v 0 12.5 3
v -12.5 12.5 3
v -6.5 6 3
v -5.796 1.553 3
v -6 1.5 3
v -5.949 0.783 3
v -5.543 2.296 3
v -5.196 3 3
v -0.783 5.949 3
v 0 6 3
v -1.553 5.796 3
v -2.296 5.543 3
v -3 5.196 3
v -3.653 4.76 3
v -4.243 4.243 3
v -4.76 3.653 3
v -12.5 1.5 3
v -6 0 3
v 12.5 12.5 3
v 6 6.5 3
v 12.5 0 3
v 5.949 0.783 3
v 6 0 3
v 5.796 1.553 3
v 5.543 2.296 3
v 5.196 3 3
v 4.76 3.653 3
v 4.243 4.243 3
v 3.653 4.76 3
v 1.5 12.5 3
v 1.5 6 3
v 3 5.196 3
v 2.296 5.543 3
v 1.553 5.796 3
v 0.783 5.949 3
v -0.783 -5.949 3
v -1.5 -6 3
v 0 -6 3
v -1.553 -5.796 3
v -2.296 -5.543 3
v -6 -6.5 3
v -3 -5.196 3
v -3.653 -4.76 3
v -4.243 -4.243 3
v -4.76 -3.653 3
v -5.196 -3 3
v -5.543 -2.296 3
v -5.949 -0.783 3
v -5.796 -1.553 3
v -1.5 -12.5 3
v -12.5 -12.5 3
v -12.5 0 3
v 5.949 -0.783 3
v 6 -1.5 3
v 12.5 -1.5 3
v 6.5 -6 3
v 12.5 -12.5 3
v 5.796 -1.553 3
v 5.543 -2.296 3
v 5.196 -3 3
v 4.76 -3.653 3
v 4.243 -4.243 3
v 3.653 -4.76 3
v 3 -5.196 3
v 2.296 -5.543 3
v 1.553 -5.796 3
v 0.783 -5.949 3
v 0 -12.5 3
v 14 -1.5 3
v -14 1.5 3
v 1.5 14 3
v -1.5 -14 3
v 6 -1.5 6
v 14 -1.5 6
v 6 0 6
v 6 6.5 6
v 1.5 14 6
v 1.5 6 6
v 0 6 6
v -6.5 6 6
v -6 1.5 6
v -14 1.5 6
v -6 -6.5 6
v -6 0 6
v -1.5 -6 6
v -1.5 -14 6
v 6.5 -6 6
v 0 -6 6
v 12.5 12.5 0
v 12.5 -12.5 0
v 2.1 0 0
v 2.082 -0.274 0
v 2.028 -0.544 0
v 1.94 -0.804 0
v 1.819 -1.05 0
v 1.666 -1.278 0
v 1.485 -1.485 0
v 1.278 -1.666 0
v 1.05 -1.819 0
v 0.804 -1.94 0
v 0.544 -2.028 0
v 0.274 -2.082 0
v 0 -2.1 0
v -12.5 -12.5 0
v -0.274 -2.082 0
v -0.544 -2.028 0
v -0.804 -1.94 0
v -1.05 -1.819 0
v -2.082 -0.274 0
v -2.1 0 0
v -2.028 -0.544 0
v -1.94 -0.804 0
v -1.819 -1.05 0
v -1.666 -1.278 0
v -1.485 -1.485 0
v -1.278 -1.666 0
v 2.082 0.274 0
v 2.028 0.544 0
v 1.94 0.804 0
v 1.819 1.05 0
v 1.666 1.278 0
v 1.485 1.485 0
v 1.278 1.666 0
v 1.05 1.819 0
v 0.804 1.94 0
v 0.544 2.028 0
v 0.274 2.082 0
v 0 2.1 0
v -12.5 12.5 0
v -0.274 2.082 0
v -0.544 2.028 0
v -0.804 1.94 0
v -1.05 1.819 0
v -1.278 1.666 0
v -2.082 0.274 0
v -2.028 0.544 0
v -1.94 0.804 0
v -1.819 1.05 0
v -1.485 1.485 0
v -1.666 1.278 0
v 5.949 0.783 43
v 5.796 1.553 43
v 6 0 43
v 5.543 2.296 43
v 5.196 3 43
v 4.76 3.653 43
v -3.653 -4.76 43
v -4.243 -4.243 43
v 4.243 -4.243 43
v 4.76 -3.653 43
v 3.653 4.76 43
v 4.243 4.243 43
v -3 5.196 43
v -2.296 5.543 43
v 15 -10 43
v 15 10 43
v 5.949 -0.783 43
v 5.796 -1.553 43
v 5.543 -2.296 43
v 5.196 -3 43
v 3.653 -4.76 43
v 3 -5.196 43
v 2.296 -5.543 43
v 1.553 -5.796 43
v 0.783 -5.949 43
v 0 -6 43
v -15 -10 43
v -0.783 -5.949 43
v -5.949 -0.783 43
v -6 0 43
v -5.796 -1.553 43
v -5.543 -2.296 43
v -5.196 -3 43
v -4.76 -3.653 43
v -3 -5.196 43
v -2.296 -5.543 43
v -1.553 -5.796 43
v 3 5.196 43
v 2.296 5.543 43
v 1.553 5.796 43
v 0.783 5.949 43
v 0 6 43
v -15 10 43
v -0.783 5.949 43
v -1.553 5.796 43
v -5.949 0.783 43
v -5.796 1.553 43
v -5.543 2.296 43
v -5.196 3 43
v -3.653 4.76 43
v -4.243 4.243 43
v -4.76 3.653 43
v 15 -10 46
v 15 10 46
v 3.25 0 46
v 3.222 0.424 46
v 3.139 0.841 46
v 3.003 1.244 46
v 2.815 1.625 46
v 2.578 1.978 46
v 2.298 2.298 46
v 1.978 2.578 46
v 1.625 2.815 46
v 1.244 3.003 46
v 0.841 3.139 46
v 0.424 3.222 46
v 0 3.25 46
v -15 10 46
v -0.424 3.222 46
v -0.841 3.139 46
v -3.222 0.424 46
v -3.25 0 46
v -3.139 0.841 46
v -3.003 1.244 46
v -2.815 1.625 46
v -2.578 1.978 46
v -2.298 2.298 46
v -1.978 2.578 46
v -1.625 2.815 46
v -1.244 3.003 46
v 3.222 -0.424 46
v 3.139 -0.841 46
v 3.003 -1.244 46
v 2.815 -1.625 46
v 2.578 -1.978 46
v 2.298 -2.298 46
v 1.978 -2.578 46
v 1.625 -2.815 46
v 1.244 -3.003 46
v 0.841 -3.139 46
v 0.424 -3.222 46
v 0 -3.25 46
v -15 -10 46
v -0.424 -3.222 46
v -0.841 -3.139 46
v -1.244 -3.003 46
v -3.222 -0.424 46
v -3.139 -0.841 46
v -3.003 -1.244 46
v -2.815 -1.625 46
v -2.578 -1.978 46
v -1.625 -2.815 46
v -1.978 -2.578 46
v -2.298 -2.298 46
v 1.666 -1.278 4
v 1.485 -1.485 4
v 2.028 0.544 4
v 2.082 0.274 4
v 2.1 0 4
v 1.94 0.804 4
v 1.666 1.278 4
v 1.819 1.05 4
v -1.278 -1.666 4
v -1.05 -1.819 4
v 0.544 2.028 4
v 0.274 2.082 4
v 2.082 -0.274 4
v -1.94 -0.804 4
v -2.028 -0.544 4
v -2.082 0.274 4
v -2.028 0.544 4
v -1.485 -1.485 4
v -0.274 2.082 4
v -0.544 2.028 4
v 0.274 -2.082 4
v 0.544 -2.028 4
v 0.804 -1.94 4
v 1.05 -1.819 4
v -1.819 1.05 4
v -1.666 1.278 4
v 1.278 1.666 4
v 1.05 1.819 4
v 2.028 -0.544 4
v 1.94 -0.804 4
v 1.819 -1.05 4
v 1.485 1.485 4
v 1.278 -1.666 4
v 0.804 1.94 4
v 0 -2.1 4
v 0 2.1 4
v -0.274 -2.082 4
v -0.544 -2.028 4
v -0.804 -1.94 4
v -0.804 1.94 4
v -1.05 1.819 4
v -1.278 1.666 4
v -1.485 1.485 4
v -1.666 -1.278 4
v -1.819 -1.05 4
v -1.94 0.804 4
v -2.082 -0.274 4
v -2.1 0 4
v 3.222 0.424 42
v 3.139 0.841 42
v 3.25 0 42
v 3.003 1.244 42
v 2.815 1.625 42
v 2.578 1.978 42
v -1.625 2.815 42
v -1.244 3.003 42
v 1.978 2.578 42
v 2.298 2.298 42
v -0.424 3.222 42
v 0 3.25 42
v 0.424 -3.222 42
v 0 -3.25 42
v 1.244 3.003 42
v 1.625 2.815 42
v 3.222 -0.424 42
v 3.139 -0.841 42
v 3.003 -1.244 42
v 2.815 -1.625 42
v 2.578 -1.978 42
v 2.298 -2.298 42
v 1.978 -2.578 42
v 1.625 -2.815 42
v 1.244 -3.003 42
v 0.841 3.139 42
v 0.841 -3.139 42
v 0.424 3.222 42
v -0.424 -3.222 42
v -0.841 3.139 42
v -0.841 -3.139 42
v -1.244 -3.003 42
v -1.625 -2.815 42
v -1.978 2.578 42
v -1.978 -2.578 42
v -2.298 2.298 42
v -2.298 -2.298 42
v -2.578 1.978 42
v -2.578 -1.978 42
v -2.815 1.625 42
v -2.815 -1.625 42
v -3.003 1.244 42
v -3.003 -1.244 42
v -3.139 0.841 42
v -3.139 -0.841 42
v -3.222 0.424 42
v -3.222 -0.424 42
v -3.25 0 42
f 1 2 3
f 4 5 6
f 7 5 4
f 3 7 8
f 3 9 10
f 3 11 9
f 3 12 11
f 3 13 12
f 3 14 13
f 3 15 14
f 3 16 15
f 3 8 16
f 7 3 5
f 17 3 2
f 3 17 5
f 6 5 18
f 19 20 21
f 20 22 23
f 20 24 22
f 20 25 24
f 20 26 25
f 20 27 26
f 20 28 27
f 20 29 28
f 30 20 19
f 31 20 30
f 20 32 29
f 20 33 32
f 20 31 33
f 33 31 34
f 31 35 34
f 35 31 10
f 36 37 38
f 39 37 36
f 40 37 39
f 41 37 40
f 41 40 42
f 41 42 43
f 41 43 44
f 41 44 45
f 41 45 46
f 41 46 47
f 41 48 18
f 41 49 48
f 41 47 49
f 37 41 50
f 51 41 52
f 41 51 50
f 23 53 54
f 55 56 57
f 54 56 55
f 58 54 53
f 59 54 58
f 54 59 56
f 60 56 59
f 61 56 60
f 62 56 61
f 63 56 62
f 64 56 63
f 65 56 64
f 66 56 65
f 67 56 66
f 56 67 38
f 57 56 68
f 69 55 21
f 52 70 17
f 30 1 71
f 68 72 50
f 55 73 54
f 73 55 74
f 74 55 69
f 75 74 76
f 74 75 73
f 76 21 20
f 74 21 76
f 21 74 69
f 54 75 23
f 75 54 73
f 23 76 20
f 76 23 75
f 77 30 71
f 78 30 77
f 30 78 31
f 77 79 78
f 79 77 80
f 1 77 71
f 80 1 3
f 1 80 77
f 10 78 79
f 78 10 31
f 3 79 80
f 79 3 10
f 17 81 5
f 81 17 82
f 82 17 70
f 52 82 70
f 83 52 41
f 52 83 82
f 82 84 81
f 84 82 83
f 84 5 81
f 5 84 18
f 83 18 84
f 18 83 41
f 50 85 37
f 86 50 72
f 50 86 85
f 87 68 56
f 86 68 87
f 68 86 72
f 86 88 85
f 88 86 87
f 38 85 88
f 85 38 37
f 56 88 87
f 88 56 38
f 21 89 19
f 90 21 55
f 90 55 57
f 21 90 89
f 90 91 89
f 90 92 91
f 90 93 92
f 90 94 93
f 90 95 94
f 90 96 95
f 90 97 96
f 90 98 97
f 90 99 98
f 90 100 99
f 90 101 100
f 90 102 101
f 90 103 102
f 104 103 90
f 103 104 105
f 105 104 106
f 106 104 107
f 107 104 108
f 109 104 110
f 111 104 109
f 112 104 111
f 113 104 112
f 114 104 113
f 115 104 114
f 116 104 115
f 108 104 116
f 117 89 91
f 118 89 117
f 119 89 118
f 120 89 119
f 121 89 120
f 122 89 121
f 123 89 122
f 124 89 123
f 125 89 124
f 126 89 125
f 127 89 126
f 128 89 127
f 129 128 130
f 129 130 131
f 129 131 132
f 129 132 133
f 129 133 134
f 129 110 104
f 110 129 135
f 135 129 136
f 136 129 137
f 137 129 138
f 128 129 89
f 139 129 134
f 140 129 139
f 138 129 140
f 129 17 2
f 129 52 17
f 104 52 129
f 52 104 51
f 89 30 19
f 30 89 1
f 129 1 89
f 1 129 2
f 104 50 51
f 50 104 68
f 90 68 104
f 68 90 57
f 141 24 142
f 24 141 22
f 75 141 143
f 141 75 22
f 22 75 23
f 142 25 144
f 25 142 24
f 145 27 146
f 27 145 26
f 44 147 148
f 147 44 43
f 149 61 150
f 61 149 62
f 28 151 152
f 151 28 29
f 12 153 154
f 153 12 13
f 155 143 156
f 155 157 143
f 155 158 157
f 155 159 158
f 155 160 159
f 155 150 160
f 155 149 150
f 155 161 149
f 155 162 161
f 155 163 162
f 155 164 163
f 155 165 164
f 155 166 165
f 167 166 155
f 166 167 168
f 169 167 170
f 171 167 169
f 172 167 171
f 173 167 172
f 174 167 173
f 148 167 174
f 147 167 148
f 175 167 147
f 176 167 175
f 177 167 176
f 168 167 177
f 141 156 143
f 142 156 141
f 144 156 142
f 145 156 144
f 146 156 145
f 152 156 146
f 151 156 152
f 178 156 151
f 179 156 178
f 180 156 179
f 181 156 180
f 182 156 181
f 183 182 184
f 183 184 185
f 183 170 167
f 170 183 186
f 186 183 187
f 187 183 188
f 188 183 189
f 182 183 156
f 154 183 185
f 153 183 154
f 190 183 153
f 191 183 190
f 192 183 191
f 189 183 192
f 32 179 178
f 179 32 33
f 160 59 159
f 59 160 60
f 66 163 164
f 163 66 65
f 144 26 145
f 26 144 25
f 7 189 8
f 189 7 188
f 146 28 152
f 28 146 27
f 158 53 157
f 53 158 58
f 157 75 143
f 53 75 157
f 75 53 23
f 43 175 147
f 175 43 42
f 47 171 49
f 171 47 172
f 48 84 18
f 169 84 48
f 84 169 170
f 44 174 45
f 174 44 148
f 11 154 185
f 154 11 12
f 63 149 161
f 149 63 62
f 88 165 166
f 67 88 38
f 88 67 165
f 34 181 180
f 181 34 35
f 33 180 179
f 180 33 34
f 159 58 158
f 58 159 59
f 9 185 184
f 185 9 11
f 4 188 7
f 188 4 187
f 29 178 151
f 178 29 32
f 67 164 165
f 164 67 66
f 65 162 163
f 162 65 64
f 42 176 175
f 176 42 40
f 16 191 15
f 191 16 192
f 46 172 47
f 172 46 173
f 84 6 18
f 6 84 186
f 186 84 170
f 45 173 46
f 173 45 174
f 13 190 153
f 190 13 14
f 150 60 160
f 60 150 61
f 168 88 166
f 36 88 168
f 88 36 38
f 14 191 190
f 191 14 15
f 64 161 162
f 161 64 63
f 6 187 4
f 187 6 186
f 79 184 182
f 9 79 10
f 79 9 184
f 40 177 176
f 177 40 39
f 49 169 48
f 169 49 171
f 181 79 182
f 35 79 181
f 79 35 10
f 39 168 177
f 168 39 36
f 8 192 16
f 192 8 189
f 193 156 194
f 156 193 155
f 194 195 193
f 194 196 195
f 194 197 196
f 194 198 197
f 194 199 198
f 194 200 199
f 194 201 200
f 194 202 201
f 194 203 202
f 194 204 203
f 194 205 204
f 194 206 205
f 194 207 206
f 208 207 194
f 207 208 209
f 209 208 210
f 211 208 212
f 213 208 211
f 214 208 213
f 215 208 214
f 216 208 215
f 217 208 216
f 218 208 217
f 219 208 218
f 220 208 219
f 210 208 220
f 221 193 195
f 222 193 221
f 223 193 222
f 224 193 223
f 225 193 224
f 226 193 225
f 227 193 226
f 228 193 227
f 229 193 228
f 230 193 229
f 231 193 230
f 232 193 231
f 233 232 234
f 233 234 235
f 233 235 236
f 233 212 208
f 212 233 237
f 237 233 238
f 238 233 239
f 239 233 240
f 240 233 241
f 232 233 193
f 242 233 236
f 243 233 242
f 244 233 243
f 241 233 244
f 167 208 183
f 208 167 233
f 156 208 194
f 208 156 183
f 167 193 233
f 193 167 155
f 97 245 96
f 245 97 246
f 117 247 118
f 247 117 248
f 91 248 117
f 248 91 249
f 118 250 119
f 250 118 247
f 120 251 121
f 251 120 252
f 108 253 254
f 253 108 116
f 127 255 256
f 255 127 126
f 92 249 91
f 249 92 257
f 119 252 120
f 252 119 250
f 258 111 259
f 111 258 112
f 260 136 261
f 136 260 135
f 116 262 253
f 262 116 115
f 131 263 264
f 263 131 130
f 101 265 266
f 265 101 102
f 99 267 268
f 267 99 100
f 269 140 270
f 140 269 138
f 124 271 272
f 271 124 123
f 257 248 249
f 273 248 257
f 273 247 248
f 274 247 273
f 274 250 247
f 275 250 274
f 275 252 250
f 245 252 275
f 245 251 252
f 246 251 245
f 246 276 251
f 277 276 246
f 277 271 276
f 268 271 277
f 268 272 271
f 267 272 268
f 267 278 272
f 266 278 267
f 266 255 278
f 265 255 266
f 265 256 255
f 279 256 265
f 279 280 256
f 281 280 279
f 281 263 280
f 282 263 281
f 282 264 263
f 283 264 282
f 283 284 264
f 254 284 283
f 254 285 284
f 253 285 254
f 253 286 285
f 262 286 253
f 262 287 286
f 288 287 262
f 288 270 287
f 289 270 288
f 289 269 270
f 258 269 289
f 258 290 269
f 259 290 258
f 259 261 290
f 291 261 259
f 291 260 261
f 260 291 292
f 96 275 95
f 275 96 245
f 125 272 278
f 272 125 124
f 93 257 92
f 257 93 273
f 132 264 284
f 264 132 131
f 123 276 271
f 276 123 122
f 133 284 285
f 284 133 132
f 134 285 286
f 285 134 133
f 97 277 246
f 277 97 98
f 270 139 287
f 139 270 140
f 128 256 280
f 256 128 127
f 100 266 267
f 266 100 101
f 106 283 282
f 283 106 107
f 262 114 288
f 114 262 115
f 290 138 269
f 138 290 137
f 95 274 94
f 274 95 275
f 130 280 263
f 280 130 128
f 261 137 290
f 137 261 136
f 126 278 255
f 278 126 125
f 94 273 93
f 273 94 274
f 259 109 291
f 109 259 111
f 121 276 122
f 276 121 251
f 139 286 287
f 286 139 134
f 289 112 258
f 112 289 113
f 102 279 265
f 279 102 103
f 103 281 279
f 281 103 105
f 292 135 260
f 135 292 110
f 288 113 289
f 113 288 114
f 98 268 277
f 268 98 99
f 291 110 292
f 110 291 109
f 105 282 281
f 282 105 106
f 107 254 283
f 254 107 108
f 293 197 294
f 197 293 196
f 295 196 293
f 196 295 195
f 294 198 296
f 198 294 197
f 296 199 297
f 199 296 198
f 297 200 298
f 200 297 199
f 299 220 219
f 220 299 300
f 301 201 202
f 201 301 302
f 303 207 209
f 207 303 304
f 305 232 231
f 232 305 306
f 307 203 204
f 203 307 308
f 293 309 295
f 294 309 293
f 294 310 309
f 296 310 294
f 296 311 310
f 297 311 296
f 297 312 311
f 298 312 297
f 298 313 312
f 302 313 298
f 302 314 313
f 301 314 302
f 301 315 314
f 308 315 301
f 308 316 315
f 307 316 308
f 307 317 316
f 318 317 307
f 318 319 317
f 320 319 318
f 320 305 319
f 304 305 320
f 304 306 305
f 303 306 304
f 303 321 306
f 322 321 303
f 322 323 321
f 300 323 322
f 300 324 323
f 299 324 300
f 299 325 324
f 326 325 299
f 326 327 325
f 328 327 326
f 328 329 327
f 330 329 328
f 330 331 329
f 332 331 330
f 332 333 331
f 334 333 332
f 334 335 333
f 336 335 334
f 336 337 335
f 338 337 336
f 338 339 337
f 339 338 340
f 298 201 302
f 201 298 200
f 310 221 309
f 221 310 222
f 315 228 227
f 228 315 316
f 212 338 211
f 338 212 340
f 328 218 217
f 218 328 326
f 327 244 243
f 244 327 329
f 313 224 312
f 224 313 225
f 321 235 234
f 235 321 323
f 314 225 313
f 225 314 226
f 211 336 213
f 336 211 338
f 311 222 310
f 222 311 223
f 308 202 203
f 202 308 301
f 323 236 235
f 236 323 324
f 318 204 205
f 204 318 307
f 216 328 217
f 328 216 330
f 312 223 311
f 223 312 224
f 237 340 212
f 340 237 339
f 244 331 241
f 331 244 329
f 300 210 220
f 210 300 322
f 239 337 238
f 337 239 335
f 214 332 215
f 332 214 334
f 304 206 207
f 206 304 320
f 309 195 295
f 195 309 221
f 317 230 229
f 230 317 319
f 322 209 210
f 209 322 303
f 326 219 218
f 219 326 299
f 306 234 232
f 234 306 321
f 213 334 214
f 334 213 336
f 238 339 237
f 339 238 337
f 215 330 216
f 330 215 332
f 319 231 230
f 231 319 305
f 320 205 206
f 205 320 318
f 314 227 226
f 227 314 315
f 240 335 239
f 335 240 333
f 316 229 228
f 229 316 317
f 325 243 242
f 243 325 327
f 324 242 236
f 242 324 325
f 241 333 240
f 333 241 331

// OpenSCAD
// EvoBot reference-01 — Webcam Mount Post (print 1x)
// Open in OpenSCAD → Render (F6) → Export STL (F7)

// Parametric dimensions (mm)
post_dia        = 12;
post_height     = 40;
base_size       = 25;
base_thick      = 3;
base_hole_dia   = 4.2;  // M4 clearance
platform_w      = 30;
platform_d      = 20;
platform_thick  = 3;
tripod_hole_dia = 6.5; // 1/4"-20 clearance

$fn = 48;

module webcam_mount() {
    difference() {
        union() {
            // Square base
            translate([-base_size/2, -base_size/2, 0])
                cube([base_size, base_size, base_thick]);
            // Vertical post
            translate([0, 0, base_thick])
                cylinder(d=post_dia, h=post_height);
            // Top platform
            translate([-platform_w/2, -platform_d/2, base_thick + post_height])
                cube([platform_w, platform_d, platform_thick]);
            // Gusset ribs (4x at 90 degree intervals)
            for (a = [0, 90, 180, 270])
                rotate([0, 0, a])
                    translate([0, -1.5, base_thick])
                        linear_extrude(height=3)
                            polygon([[post_dia/2, 0],
                                     [post_dia/2 + 8, 0],
                                     [post_dia/2, 8]]);
        }
        // Base center hole (M4)
        translate([0, 0, -1])
            cylinder(d=base_hole_dia, h=base_thick + 2);
        // Platform tripod hole (1/4"-20)
        translate([0, 0, base_thick + post_height - 1])
            cylinder(d=tripod_hole_dia, h=platform_thick + 2);
    }
}

webcam_mount();
